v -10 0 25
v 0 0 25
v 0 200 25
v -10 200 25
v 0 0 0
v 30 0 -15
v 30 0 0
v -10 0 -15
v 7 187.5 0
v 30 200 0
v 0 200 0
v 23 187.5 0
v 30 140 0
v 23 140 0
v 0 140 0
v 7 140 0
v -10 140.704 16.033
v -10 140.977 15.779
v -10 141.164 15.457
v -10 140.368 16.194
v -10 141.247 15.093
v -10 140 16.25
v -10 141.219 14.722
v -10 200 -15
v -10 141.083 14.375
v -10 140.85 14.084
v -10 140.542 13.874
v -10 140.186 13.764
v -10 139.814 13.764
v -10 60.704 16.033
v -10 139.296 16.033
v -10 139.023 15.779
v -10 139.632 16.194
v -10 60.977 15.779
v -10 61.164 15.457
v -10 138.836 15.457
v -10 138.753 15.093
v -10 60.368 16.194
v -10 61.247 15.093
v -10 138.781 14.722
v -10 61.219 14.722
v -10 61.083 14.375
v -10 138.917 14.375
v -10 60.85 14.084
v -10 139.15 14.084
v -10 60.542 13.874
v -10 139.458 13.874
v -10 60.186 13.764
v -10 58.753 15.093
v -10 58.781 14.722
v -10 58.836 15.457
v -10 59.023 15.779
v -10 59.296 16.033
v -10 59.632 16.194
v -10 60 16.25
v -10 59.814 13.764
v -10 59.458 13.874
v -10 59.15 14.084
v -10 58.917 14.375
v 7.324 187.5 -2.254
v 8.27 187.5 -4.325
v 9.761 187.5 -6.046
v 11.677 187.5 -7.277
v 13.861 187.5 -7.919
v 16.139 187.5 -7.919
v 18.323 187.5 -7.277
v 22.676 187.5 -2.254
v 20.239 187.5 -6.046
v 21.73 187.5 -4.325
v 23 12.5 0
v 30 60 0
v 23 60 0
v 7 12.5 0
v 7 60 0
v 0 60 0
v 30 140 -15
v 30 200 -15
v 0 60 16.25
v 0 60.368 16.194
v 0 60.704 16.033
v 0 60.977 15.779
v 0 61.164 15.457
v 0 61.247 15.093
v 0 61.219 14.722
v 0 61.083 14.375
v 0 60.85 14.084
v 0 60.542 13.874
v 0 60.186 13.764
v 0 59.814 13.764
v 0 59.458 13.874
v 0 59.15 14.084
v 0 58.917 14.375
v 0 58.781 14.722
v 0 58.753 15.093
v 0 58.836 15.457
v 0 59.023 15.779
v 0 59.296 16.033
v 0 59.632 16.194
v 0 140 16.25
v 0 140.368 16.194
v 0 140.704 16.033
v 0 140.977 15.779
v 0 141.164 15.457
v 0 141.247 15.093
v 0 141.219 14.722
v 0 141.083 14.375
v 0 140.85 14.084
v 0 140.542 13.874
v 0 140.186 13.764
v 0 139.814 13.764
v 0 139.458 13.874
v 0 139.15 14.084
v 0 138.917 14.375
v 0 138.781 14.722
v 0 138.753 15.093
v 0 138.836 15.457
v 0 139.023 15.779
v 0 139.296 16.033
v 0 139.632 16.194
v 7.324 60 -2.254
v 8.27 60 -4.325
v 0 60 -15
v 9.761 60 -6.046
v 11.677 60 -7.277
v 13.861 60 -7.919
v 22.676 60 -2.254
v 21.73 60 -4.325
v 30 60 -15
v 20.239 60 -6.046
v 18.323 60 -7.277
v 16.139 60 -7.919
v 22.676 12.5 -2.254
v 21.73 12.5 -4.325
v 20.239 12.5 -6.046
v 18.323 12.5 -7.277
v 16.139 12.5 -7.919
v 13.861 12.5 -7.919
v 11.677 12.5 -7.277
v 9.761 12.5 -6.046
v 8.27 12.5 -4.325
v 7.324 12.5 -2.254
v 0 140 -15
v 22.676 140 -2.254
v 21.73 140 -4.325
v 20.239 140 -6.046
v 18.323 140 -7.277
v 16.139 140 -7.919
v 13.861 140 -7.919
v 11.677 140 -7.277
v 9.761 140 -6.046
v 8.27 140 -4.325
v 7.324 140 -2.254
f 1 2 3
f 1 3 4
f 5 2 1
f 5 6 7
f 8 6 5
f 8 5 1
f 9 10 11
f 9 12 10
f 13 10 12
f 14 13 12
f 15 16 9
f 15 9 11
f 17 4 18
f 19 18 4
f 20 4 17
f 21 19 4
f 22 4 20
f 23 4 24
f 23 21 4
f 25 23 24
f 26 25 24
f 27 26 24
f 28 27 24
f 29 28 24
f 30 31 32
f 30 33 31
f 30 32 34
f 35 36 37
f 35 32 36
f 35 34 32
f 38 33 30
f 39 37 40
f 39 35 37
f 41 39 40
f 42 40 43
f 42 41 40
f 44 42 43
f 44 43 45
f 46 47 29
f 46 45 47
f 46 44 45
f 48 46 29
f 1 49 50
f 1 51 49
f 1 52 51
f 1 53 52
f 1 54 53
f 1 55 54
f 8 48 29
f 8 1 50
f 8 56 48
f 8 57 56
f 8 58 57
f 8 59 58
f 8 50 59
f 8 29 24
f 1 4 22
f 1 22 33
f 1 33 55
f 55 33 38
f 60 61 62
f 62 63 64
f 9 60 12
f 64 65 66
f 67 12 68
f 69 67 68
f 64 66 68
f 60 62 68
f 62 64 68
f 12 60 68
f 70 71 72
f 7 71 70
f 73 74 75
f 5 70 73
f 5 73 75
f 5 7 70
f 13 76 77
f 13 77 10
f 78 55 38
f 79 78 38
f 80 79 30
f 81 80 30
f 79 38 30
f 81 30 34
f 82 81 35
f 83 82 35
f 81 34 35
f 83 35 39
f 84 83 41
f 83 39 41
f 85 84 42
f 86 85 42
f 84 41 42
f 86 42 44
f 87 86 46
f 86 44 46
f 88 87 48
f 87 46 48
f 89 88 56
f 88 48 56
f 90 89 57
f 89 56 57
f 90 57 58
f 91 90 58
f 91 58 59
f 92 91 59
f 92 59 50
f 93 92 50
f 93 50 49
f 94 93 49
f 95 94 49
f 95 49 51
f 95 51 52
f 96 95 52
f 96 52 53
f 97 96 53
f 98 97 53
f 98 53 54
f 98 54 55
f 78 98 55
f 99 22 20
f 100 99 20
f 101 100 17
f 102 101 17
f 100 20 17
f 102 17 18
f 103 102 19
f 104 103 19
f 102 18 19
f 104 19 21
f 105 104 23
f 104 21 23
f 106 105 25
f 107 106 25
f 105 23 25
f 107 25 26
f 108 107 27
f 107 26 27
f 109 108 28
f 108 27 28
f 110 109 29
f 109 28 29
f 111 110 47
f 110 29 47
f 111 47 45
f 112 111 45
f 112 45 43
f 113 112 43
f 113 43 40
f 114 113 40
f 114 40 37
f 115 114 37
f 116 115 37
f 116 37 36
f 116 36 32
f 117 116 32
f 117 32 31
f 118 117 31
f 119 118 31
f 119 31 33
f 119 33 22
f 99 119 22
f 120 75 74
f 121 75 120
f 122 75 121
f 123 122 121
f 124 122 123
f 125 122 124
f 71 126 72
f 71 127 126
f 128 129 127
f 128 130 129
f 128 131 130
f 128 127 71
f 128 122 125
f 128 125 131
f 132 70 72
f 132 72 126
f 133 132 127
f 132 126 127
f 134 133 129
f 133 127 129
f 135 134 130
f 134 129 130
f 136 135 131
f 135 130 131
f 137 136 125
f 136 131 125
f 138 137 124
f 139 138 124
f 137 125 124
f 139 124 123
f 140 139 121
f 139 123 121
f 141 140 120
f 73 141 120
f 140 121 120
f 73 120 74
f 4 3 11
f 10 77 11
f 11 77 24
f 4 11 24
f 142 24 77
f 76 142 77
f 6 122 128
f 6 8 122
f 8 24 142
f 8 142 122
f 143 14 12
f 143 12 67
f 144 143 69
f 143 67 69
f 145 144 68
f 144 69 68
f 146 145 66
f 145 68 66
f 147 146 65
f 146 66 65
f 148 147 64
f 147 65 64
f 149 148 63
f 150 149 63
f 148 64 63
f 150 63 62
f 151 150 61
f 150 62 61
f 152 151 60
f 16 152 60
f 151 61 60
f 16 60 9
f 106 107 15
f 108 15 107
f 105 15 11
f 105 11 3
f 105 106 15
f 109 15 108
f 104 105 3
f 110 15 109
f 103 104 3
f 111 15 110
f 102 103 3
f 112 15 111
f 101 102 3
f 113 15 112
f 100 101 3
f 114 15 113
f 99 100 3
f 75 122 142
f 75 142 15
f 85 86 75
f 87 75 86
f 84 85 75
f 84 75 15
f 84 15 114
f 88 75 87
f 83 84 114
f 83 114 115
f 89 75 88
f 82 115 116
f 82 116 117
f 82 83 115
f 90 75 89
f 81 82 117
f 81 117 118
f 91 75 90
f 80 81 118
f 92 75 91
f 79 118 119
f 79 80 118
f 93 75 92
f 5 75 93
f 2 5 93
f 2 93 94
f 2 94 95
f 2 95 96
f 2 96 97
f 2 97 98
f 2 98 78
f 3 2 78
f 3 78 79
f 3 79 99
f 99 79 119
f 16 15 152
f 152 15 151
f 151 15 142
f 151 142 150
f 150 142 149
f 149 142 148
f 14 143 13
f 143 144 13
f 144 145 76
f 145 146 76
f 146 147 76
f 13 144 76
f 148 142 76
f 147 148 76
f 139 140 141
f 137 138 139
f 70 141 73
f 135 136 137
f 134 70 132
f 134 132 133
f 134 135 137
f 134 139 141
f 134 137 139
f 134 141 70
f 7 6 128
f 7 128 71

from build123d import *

# Parameters (mm, degrees)
EXTRUDE_2_DEPTH     = 200
SKETCH_3_R          = 8
CUT_EXTRUDE_1_DEPTH = 175
SKETCH_4_W          = 30
SKETCH_4_H          = 15
CUT_EXTRUDE_2_DEPTH = 80
HOLE_WIZARD_M3_1_D  = 2.5


with BuildPart() as part:
    # 草图1 → 凸台-拉伸2 (new body)
    with BuildSketch(Plane(origin=(0, 0, 0), x_dir=(1, 0, 0), z_dir=(0, 1, 0))):
        Polygon((0, 0), (0, -25), (-10, -25), (-10, 15), (30, 15), (30, 0), align=None)
    extrude(amount=EXTRUDE_2_DEPTH)

    # 草图3 → 切除-拉伸1 (cut)
    with BuildSketch(Plane(origin=(0, 187.5, 0), x_dir=(1, 0, 0), z_dir=(0, 1, 0))):
        with Locations((15, 0)):
            Circle(SKETCH_3_R)
    extrude(amount=-CUT_EXTRUDE_1_DEPTH, mode=Mode.SUBTRACT)

    # 草图4 → 切除-拉伸2 (cut)
    with BuildSketch(Plane(origin=(0, 140, 0), x_dir=(1, 0, 0), z_dir=(0, 1, 0))):
        with Locations((15, 7.5)):
            Rectangle(SKETCH_4_W, SKETCH_4_H)
    extrude(amount=-CUT_EXTRUDE_2_DEPTH, mode=Mode.SUBTRACT)

    # M3 螺纹孔1 (through all)
    with Locations(Plane(origin=(0, 0, 0), x_dir=(0, 0, -1), z_dir=(1, 0, 0))):
        with Locations((-15, 140), (-15, 60)):
            Hole(HOLE_WIZARD_M3_1_D / 2)


solid = part.part
